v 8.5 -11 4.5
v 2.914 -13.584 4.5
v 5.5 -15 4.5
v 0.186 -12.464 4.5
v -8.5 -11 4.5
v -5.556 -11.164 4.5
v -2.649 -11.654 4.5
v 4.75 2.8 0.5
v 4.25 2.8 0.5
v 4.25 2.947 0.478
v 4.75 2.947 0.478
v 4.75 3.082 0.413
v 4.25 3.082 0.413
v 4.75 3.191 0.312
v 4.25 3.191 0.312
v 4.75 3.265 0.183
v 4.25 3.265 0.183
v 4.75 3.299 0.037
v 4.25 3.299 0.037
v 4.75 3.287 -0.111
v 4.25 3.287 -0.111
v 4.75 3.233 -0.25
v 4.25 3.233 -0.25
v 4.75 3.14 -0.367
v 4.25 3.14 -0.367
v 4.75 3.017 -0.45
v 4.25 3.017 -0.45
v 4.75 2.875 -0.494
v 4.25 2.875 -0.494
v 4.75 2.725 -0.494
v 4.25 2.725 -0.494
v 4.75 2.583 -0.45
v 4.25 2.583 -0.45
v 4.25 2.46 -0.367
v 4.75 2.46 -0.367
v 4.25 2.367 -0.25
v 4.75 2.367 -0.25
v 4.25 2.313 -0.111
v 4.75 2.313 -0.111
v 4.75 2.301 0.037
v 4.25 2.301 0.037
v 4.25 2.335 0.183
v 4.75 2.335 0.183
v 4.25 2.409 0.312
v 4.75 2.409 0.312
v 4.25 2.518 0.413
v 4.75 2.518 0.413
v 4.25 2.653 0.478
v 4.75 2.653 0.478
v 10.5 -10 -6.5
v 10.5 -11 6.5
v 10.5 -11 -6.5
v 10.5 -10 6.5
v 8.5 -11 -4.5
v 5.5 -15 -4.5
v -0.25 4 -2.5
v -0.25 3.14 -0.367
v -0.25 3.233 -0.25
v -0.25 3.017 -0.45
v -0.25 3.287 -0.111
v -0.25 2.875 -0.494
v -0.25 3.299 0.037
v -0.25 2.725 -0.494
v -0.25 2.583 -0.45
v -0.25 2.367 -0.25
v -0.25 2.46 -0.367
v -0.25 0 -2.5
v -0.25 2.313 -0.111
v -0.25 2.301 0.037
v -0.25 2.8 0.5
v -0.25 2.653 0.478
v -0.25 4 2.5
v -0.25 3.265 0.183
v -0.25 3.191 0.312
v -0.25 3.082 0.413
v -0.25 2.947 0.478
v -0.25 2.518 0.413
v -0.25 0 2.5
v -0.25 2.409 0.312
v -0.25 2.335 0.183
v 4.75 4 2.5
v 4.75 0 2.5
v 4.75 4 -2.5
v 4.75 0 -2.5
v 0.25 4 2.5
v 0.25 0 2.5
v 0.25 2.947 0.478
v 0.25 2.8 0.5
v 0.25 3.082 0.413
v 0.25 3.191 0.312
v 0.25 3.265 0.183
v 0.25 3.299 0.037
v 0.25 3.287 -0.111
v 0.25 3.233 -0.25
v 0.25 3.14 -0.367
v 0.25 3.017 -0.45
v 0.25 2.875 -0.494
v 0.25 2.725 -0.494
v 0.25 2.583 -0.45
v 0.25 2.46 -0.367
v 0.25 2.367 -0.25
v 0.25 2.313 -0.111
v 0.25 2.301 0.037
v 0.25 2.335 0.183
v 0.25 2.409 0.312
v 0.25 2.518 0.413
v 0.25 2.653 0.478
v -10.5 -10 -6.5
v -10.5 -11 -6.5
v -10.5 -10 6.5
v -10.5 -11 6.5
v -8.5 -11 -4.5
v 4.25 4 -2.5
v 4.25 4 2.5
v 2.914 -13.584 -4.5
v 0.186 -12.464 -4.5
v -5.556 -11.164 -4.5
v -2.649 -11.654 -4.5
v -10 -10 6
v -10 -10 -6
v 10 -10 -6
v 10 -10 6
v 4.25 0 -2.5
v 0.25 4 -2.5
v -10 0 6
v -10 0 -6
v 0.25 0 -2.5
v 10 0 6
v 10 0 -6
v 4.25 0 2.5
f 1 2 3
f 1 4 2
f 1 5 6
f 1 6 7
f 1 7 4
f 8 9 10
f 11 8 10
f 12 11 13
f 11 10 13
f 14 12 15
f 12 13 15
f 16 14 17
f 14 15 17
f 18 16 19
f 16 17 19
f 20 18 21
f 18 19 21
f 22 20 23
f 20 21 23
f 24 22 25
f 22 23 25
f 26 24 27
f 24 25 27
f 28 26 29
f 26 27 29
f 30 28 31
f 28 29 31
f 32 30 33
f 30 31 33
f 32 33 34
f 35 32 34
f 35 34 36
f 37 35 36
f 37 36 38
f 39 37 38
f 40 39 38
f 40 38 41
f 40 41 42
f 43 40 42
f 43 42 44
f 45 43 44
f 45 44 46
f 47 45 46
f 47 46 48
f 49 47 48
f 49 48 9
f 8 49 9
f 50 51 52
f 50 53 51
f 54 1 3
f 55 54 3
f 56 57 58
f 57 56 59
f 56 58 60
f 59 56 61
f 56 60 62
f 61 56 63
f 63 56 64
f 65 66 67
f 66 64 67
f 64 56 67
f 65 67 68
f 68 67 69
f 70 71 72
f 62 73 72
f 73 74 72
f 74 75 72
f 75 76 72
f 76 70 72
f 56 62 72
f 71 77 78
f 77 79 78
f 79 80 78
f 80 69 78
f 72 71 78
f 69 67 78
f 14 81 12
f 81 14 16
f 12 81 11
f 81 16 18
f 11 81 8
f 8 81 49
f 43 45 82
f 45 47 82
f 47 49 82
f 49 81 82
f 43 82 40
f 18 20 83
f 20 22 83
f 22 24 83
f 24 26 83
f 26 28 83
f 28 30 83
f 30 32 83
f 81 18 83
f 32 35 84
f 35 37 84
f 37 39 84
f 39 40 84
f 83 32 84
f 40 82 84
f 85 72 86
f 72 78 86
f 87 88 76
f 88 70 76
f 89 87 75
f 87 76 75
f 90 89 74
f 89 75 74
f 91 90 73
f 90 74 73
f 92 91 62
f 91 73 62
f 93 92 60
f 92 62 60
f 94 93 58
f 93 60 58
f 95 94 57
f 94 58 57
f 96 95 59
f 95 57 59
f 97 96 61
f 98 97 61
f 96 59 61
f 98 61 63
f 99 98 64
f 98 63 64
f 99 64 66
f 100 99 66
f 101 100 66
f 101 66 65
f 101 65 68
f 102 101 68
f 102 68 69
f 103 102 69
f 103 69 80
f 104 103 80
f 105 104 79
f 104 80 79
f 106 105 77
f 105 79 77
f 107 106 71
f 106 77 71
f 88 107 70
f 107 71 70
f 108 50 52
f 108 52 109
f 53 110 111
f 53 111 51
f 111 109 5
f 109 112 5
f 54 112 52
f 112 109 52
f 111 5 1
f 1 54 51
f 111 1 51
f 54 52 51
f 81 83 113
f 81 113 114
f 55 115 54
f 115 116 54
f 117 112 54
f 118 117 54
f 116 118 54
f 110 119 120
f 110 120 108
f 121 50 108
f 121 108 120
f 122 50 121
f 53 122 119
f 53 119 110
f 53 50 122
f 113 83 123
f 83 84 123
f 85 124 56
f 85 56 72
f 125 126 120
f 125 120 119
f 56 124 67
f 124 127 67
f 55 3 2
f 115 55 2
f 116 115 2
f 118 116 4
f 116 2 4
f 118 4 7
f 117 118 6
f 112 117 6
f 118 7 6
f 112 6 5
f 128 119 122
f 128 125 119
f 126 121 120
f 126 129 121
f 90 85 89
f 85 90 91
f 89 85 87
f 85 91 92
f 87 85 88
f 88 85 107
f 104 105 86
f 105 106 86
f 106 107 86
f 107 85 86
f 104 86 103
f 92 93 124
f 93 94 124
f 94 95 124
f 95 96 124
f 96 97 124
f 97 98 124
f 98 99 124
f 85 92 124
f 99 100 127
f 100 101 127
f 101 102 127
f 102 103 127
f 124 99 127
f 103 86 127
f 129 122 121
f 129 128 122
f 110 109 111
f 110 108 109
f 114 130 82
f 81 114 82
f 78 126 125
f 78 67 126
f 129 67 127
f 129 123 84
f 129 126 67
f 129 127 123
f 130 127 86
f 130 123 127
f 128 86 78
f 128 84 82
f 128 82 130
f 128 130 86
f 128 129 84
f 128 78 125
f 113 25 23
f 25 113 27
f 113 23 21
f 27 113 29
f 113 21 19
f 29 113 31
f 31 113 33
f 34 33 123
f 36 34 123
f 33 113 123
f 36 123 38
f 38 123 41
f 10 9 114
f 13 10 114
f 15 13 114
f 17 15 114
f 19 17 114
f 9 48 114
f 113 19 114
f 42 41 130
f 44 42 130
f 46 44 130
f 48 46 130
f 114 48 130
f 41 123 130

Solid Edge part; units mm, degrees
sketch "Sketch1" plane through (0, 0, 0) normal (0, -1, 0) x (1, 0, 0)
  line L0 (-10, 6) -> (10, 6)
  line L1 (10, 6) -> (10, -6)
  line L2 (10, -6) -> (-10, -6)
  line L3 (-10, -6) -> (-10, 6)
  dimension "D1" = 20
  dimension "D2" = 12
extrude "Protrusion1" add sketch "Sketch1" along normal blind 10
sketch "Sketch2" plane through (0, -10, 0) normal (0, -1, 0) x (1, 0, 0)
  line L0 (-10.5, 6.5) -> (10.5, 6.5)
  line L1 (10.5, 6.5) -> (10.5, -6.5)
  line L2 (10.5, -6.5) -> (-10.5, -6.5)
  line L3 (-10.5, -6.5) -> (-10.5, 6.5)
  dimension "D1" = 0.5
extrude "Wall" add sketch "Sketch2" along normal blind 1
sketch "Sketch3" plane through (0, -10.5, 4.5) normal (0, 0, 1) x (1, 0, 0)
  line L0 (8.5, -0.5) -> (-8.5, -0.5)
  arc A0 (5.5, -4.5) -> (-8.5, -0.5) centre (-8.5, -27) ccw
  line L1 (8.5, -0.5) -> (5.5, -4.5)
  dimension "D1" = 4
  dimension "D2" = 5
  dimension "D3" = 2
  dimension "D4" = 2
extrude "Button_Profile_Plane1" add sketch "Sketch3" against normal blind 9
sketch "Sketch4" plane through (0, 0, 0) normal (0, 1, 0) x (-1, 0, 0)
  line L0 (-4.75, -2.5) -> (-4.25, -2.5)
  line L1 (-4.25, -2.5) -> (-4.25, 2.5)
  line L2 (-4.25, 2.5) -> (-4.75, 2.5)
  line L3 (-4.75, 2.5) -> (-4.75, -2.5)
  line L4 (-0.25, -2.5) -> (0.25, -2.5)
  line L5 (0.25, -2.5) -> (0.25, 2.5)
  line L6 (0.25, 2.5) -> (-0.25, 2.5)
  line L7 (-0.25, 2.5) -> (-0.25, -2.5)
  dimension "D1" = 5
  dimension "D2" = 0.5
  dimension "D3" = 4
extrude "Electrics" add sketch "Sketch4" along normal blind 4
hole "Wire" at (-0.25, 2.8, 0) direction (1, 0, 0) diameter 1 end through all
properties material "ABS Plastic, high impact"
